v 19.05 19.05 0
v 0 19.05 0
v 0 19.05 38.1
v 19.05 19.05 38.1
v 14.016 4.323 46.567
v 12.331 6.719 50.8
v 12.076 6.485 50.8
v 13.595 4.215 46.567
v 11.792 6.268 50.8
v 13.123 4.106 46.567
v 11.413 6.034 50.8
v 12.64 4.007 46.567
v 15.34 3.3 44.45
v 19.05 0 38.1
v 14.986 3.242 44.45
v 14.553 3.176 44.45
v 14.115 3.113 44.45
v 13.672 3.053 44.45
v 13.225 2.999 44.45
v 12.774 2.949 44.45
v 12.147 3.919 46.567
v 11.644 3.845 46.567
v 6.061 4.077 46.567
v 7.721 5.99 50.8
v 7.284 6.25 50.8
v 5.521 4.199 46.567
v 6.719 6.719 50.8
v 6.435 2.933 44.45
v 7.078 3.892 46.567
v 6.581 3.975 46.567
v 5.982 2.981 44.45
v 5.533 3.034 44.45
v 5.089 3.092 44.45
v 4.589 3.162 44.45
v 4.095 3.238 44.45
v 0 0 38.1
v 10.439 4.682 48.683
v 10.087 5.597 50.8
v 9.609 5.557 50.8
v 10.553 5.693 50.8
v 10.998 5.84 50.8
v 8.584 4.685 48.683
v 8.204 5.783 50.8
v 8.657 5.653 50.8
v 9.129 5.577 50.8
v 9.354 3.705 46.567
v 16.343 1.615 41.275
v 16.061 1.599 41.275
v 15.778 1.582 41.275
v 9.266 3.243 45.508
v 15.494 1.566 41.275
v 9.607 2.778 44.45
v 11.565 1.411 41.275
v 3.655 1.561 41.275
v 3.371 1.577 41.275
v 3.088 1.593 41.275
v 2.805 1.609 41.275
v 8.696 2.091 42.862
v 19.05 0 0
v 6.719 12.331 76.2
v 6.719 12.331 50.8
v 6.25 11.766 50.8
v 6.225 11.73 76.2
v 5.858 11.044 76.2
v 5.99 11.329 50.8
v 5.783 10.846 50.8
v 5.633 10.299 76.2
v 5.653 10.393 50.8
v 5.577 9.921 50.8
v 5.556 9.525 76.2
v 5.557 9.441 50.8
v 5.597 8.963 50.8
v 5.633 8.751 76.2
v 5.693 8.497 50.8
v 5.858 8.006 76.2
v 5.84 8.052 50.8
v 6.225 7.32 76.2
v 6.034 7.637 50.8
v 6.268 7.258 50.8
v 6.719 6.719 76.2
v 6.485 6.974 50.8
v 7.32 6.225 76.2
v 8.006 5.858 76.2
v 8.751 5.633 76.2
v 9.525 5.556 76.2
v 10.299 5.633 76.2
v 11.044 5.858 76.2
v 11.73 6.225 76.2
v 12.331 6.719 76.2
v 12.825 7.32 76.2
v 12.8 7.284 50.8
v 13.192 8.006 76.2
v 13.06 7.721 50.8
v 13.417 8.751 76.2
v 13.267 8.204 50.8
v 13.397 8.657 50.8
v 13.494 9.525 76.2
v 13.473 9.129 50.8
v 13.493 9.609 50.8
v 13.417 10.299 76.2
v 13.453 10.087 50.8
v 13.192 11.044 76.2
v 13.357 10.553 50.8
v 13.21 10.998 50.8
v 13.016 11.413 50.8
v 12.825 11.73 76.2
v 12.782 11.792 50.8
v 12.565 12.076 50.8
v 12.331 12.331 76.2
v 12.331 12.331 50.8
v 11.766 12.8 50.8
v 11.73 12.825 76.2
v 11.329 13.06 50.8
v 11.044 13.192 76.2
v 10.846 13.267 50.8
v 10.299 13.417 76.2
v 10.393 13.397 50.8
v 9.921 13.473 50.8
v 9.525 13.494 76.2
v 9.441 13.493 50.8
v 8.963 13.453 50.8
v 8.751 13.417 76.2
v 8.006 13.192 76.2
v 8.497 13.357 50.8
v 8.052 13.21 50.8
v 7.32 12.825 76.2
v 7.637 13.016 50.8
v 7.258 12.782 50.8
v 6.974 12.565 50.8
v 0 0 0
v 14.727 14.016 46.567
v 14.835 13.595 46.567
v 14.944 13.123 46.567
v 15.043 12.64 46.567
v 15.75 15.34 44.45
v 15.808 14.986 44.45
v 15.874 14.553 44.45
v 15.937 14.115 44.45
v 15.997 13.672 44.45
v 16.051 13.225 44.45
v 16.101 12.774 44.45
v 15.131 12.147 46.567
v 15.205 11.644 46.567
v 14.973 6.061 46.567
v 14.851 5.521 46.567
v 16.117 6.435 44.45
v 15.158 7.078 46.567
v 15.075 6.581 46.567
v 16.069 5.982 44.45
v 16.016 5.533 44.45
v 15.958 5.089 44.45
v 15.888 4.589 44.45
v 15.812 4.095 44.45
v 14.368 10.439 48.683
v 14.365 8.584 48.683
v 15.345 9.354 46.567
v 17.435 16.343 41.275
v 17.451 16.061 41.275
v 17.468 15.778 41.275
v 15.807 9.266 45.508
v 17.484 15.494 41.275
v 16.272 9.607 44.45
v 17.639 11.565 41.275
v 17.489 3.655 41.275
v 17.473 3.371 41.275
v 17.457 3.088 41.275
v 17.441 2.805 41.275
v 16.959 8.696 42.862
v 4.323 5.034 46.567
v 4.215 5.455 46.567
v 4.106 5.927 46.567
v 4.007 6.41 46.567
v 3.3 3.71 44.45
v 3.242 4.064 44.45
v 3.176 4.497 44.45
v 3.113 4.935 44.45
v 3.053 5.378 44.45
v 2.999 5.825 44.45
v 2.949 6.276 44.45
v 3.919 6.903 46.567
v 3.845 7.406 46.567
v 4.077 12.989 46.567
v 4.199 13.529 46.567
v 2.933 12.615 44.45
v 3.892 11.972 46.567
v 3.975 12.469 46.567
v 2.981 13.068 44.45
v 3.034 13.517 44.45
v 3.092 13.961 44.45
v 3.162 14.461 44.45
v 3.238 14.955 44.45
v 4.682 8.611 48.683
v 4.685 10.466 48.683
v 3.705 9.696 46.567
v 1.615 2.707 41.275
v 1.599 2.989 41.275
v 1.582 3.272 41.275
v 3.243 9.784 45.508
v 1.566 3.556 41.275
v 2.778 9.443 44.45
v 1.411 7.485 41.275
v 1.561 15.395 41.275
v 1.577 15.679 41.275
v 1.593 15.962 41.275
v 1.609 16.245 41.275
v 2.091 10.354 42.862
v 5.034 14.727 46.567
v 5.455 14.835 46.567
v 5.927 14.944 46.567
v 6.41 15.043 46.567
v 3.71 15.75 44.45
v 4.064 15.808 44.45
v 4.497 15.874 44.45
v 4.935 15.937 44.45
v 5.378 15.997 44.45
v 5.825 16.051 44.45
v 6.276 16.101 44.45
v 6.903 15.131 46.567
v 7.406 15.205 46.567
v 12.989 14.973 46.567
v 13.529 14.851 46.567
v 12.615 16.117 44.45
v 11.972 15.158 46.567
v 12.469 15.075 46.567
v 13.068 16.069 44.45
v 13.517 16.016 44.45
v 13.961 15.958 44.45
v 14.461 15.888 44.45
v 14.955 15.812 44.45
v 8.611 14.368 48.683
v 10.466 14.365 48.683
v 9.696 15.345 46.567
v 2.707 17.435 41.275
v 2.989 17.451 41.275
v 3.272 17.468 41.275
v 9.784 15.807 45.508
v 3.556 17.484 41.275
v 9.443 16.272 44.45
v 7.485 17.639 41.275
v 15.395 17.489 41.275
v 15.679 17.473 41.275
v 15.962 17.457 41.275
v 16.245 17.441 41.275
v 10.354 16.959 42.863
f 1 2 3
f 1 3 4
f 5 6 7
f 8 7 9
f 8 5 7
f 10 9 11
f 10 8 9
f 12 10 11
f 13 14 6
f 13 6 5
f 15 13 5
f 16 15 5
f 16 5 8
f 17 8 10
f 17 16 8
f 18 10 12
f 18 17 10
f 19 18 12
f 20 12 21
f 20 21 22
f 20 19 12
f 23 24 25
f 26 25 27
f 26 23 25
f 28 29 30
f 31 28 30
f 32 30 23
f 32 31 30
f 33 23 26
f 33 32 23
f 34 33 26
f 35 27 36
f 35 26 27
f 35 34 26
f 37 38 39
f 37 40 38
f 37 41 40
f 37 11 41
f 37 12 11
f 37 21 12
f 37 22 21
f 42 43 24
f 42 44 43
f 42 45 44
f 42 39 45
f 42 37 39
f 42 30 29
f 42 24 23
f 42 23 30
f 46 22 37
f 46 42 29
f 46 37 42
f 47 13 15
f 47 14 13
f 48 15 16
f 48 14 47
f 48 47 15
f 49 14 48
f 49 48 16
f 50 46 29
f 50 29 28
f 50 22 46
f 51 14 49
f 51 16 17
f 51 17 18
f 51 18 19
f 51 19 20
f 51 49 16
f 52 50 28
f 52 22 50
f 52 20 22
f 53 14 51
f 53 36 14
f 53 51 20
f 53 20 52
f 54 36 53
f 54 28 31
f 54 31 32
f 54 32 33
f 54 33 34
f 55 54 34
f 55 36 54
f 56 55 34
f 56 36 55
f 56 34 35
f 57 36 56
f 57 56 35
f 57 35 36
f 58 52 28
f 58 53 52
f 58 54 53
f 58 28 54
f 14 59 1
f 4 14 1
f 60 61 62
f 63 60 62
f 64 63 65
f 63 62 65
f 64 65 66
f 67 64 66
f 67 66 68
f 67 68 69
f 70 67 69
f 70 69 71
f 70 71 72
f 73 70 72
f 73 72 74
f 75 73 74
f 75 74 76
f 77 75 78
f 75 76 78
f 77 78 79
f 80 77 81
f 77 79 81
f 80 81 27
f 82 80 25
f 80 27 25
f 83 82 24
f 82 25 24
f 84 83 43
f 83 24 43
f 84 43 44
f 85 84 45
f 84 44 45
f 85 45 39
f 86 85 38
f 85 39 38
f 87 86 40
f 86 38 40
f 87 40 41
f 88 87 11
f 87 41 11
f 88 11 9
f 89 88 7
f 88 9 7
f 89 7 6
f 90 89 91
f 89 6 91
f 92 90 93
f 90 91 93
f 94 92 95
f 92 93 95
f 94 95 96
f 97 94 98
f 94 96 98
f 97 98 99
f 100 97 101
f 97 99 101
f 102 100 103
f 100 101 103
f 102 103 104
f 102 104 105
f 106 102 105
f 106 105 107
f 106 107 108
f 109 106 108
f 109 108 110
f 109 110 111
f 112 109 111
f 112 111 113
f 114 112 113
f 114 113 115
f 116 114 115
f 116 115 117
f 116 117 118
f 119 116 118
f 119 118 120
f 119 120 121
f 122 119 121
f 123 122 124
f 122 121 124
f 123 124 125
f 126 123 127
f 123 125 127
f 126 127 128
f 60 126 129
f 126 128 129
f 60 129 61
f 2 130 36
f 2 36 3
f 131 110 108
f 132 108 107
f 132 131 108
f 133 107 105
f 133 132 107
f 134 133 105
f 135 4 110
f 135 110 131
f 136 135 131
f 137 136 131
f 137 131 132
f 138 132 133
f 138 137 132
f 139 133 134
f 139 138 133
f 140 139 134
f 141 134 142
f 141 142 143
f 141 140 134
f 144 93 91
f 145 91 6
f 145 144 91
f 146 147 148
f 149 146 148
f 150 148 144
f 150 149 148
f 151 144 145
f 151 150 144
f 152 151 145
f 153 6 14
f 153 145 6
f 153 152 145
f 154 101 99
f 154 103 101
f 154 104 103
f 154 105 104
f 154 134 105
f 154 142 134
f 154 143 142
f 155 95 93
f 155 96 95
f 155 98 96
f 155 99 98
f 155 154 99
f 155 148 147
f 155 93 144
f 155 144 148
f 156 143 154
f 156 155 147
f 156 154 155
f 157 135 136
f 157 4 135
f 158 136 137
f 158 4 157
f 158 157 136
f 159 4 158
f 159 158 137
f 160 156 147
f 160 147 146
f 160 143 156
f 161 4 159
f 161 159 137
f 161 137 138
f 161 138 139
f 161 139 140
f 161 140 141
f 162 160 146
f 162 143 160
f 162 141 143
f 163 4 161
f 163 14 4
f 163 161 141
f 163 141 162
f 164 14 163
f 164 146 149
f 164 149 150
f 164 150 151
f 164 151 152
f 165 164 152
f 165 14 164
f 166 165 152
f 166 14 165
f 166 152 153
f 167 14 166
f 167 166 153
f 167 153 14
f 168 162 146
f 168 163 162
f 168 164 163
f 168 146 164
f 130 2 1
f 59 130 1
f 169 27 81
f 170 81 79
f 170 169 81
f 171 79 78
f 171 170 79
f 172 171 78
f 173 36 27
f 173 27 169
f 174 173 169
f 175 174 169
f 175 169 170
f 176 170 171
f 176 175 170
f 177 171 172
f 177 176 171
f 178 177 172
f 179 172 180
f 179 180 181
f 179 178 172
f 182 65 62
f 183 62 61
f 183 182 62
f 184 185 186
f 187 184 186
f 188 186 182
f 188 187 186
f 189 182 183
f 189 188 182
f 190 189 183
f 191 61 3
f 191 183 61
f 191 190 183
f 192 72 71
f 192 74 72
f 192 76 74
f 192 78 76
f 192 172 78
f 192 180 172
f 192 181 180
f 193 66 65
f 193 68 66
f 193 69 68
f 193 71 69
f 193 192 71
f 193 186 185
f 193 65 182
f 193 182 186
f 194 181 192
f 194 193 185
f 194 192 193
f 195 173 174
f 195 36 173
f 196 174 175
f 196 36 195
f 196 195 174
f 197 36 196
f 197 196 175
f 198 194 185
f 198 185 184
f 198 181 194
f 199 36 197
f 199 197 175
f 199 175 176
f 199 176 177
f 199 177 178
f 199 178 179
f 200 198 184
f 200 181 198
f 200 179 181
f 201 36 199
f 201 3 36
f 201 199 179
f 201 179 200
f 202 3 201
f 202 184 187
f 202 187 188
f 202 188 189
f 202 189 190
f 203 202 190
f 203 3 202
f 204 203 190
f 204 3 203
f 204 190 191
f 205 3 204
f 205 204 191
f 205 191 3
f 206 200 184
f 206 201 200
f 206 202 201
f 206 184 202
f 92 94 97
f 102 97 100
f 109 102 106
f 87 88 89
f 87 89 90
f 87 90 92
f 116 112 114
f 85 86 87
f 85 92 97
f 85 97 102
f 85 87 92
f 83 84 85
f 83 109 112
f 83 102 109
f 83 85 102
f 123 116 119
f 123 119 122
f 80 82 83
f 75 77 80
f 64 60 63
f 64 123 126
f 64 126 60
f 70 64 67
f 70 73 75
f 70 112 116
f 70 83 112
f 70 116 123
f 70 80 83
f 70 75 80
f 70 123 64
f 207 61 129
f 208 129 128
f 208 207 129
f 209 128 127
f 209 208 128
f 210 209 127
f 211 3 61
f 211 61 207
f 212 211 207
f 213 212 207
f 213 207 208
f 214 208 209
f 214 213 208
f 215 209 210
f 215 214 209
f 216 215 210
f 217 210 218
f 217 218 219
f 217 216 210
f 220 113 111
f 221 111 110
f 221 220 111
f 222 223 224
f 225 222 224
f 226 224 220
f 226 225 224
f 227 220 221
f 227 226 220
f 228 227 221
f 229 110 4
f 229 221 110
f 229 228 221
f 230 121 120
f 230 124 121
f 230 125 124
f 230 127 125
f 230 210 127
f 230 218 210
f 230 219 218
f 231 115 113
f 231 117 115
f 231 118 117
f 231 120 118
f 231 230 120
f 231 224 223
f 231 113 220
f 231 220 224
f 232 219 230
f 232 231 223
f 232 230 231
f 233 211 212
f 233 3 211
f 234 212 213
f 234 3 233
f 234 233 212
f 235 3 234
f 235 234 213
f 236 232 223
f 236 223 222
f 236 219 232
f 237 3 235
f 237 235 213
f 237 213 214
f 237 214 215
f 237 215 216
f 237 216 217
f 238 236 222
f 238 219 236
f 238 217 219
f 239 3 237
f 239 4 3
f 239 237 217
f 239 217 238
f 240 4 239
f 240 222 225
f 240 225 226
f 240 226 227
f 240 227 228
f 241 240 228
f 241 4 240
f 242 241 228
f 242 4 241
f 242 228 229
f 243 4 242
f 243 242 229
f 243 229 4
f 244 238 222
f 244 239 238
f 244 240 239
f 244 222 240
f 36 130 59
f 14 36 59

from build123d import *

# Parameters (mm, degrees)
SKETCH1_W           = 19.05
SKETCH1_H           = 19.05
BOSS_EXTRUDE1_DEPTH = 38.1
SKETCH3_3_R         = 3.96875
BOSS_EXTRUDE3_DEPTH = 25.4


with BuildPart() as part:
    # Sketch1 → Boss-Extrude1 (new body)
    with BuildSketch(Plane.XY):
        with Locations((9.525, 9.525)):
            Rectangle(SKETCH1_W, SKETCH1_H)
    extrude(amount=BOSS_EXTRUDE1_DEPTH)

    # Loft3: read off the stored shape, not the designer's step
    # Loft3: loft between two sections, ruled curve by curve
    loft3_from = [
        Edge.make_bspline([(12.331330038, 12.331330038, 50.8), (12.662059205, 12.000600871, 50.8), (12.958598179, 11.583509037, 50.8), (13.375977978, 10.619086159, 50.8), (13.49375, 10.072970025, 50.8), (13.49375, 8.977029975, 50.8), (13.375977978, 8.430913841, 50.8), (12.958598179, 7.466490963, 50.8), (12.662059205, 7.049399129, 50.8), (12.331330038, 6.718669962, 50.8)], [0, 0, 0, 0, 0.25, 0.25, 0.5, 0.5, 0.75, 0.75, 1, 1, 1, 1], 3),
        Edge.make_bspline([(12.331330038, 6.718669962, 50.8), (12.000600871, 6.387940795, 50.8), (11.583509037, 6.091401821, 50.8), (10.619086159, 5.674022022, 50.8), (10.072970025, 5.55625, 50.8), (8.977029975, 5.55625, 50.8), (8.430913841, 5.674022022, 50.8), (7.466490963, 6.091401821, 50.8), (7.049399129, 6.387940795, 50.8), (6.718669962, 6.718669962, 50.8)], [0, 0, 0, 0, 0.25, 0.25, 0.5, 0.5, 0.75, 0.75, 1, 1, 1, 1], 3),
        Edge.make_bspline([(6.718669962, 12.331330038, 50.8), (7.049399129, 12.662059205, 50.8), (7.466490963, 12.958598179, 50.8), (8.430913841, 13.375977978, 50.8), (8.977029975, 13.49375, 50.8), (10.072970025, 13.49375, 50.8), (10.619086159, 13.375977978, 50.8), (11.583509037, 12.958598179, 50.8), (12.000600871, 12.662059205, 50.8), (12.331330038, 12.331330038, 50.8)], [0, 0, 0, 0, 0.25, 0.25, 0.5, 0.5, 0.75, 0.75, 1, 1, 1, 1], 3),
        Edge.make_bspline([(6.718669962, 6.718669962, 50.8), (6.387940795, 7.049399129, 50.8), (6.091401821, 7.466490963, 50.8), (5.674022022, 8.430913841, 50.8), (5.55625, 8.977029975, 50.8), (5.55625, 10.072970025, 50.8), (5.674022022, 10.619086159, 50.8), (6.091401821, 11.583509037, 50.8), (6.387940795, 12.000600871, 50.8), (6.718669962, 12.331330038, 50.8)], [0, 0, 0, 0, 0.25, 0.25, 0.5, 0.5, 0.75, 0.75, 1, 1, 1, 1], 3),
    ]
    loft3_to = [
        Edge.make_bspline([(19.05, 19.05, 38.1), (19.05, 17.4625, 38.1), (19.05, 15.875, 38.1), (19.05, 12.7, 38.1), (19.05, 11.1125, 38.1), (19.05, 7.9375, 38.1), (19.05, 6.35, 38.1), (19.05, 3.175, 38.1), (19.05, 1.5875, 38.1), (19.05, 0, 38.1)], [0, 0, 0, 0, 0.25, 0.25, 0.5, 0.5, 0.75, 0.75, 1, 1, 1, 1], 3),
        Edge.make_bspline([(19.05, 0, 38.1), (17.4625, 0, 38.1), (15.875, 0, 38.1), (12.7, 0, 38.1), (11.1125, 0, 38.1), (7.9375, 0, 38.1), (6.35, 0, 38.1), (3.175, 0, 38.1), (1.5875, 0, 38.1), (0, 0, 38.1)], [0, 0, 0, 0, 0.25, 0.25, 0.5, 0.5, 0.75, 0.75, 1, 1, 1, 1], 3),
        Edge.make_bspline([(0, 19.05, 38.1), (1.5875, 19.05, 38.1), (3.175, 19.05, 38.1), (6.35, 19.05, 38.1), (7.9375, 19.05, 38.1), (11.1125, 19.05, 38.1), (12.7, 19.05, 38.1), (15.875, 19.05, 38.1), (17.4625, 19.05, 38.1), (19.05, 19.05, 38.1)], [0, 0, 0, 0, 0.25, 0.25, 0.5, 0.5, 0.75, 0.75, 1, 1, 1, 1], 3),
        Edge.make_bspline([(0, 0, 38.1), (0, 1.5875, 38.1), (0, 3.175, 38.1), (0, 6.35, 38.1), (0, 7.9375, 38.1), (0, 11.1125, 38.1), (0, 12.7, 38.1), (0, 15.875, 38.1), (0, 17.4625, 38.1), (0, 19.05, 38.1)], [0, 0, 0, 0, 0.25, 0.25, 0.5, 0.5, 0.75, 0.75, 1, 1, 1, 1], 3),
    ]
    loft3 = Solid(Shell([*[Face.make_surface_from_curves(loft3_from[k], loft3_to[k]) for k in range(4)], Face(Wire(loft3_from)), Face(Wire(loft3_to))]))
    add(loft3)

    # Sketch3<3> → Boss-Extrude3 (add)
    with BuildSketch(Plane.XY.offset(50.8)):
        with Locations(Location((9.525, 9.525, 0), (0, 0, 135))):
            Circle(SKETCH3_3_R)
    extrude(amount=BOSS_EXTRUDE3_DEPTH)


solid = part.part
